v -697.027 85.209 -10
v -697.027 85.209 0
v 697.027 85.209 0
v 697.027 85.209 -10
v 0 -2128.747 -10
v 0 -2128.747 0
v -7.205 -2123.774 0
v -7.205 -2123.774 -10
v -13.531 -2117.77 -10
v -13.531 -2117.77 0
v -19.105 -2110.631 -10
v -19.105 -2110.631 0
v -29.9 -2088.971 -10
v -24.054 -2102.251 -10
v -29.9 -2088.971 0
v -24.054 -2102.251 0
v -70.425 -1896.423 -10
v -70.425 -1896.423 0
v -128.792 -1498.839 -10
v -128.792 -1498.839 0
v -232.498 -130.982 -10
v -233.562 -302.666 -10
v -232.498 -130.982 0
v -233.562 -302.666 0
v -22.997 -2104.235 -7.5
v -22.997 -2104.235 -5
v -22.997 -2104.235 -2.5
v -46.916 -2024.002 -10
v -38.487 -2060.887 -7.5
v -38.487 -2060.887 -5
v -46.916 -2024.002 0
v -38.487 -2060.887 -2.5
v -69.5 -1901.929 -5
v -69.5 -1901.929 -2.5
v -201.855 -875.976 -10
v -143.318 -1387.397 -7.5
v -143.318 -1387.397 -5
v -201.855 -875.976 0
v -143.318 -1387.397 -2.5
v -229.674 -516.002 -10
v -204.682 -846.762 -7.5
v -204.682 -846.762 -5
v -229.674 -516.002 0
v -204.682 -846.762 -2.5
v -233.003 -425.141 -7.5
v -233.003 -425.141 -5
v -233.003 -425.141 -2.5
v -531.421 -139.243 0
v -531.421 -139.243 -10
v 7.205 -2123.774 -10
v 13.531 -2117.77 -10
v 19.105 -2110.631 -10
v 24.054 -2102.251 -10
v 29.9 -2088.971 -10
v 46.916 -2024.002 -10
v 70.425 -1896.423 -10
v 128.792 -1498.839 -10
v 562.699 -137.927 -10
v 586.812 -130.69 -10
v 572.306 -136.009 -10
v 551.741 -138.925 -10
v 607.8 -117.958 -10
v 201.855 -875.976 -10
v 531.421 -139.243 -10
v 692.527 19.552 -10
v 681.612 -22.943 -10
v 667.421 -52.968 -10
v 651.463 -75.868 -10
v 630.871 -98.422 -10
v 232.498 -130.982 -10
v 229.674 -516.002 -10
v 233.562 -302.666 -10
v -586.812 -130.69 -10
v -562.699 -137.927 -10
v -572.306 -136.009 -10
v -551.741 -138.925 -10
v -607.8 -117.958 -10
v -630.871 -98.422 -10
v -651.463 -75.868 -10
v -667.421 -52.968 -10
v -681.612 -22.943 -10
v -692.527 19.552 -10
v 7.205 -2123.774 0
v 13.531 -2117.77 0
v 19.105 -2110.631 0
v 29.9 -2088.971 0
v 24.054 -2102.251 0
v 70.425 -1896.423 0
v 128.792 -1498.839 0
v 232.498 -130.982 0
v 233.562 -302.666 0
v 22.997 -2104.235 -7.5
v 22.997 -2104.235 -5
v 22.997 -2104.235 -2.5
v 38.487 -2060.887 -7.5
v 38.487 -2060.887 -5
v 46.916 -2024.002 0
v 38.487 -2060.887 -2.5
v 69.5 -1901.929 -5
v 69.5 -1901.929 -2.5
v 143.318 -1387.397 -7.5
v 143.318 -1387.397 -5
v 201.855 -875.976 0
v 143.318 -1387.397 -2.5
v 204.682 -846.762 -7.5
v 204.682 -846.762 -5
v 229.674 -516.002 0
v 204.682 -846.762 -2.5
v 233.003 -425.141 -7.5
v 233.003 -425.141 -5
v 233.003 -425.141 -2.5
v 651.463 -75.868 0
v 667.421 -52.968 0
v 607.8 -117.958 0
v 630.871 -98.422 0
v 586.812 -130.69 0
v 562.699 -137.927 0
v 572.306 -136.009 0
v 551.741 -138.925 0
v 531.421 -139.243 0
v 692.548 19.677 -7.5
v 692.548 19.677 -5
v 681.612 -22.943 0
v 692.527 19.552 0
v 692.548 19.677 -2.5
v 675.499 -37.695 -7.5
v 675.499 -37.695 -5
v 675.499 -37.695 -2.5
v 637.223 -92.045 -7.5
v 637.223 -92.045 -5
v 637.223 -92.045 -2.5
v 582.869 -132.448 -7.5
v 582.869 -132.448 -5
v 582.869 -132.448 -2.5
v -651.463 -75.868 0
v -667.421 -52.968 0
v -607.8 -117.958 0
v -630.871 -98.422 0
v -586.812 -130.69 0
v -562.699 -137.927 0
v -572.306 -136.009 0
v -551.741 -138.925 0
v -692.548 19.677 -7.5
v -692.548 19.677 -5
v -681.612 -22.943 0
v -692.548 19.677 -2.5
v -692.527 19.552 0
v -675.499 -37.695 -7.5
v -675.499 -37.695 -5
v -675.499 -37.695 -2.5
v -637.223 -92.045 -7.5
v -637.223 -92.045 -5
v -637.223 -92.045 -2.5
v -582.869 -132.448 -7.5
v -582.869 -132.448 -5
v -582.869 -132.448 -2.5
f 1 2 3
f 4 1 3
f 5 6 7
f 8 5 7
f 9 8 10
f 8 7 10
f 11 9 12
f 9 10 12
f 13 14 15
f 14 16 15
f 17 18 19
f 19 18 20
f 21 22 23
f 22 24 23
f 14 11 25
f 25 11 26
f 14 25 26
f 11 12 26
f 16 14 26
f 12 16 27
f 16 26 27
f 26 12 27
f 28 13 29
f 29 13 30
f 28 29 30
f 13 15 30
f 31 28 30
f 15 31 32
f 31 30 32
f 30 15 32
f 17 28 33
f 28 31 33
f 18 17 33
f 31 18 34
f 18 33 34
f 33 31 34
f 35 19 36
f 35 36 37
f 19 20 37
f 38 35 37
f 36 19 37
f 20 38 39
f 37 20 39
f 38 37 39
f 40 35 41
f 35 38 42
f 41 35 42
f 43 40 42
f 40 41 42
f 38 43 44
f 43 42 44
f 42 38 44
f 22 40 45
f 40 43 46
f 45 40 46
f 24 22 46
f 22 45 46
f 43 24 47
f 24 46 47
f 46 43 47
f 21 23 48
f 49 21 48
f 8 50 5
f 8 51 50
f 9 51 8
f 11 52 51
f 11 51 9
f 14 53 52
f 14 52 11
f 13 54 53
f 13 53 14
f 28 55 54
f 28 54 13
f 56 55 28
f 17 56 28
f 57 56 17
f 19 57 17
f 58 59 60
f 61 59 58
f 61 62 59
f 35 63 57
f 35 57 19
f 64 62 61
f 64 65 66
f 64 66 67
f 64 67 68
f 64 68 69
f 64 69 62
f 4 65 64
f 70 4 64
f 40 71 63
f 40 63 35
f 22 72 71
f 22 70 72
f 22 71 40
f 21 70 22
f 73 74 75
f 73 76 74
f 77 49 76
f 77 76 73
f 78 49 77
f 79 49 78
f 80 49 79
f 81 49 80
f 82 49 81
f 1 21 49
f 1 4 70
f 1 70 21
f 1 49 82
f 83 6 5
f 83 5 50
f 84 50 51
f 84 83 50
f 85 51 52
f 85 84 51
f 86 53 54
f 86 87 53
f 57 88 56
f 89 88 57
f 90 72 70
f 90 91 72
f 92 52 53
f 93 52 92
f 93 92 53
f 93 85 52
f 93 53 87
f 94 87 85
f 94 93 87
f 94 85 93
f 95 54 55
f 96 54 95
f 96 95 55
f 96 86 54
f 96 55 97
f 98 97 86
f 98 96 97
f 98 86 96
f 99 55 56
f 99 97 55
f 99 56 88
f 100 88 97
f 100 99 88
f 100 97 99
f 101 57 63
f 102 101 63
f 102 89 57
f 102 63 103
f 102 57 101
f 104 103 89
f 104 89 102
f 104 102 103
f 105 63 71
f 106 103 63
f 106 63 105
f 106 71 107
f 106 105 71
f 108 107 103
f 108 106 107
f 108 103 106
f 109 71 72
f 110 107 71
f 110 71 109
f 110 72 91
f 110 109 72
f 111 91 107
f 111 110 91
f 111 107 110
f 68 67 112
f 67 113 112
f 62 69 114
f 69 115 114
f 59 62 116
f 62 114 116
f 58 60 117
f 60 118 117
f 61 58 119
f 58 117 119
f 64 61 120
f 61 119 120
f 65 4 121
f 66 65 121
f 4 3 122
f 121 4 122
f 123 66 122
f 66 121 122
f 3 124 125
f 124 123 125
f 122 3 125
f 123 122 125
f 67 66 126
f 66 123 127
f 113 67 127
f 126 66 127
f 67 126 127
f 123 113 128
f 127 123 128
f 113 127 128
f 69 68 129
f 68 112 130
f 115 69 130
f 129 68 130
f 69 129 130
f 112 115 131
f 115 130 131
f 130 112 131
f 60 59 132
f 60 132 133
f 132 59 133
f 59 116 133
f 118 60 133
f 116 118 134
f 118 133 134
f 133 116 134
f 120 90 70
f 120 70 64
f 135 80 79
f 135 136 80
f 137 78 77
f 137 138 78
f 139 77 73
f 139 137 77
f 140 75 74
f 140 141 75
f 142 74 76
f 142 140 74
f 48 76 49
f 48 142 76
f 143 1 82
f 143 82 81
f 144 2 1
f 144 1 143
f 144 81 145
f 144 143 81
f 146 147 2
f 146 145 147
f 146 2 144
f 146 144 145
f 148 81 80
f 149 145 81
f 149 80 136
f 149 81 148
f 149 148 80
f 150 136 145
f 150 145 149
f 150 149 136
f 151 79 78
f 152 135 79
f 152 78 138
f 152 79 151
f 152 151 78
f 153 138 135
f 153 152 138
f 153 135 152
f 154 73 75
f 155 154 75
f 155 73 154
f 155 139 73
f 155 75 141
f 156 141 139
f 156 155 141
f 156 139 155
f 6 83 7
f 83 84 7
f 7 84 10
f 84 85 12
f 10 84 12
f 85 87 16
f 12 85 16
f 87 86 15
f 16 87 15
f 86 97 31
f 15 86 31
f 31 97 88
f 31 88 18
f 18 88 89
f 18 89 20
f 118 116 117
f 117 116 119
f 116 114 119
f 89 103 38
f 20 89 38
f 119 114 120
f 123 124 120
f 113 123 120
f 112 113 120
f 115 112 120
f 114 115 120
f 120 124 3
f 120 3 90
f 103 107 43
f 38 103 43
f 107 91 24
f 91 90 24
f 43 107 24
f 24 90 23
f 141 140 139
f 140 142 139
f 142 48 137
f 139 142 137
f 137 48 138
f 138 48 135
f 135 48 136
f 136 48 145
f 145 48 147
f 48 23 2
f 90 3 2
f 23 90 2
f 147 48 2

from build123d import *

# Parameters (mm, degrees)
F1_DEPTH = 10


with BuildPart() as f1:
    # F0 (on Top) → F1 (new body)
    with BuildSketch(Plane.XY):
        with BuildLine():
            Line((0, 85.2085053921), (0, -2128.7469863892))
            add(Edge.make_bspline(
                [(0, -2128.7469863892), (23.4590560131, -2115.0394865653), (59.9170876984, -2011.671111051), (178.1400323392, -1163.3441643463), (243.8064615583, -449.7847110684), (230.7232242509, -219.4097479535), (232.4981689453, -130.9822052717)],
                knots=[0, 0, 0, 0, 0.1206653396, 0.4678392709, 0.7964320829, 1, 1, 1, 1], degree=3))
            Line((232.4981689453, -130.9822052717), (531.4212441444, -139.2431110144))
            add(Edge.make_bspline(
                [(697.026848793, 85.2085053921), (697.5812315941, 54.1675575078), (692.2096198324, -0.9683446135), (663.0294773679, -71.7880519639), (586.4163084622, -141.5486278427), (548.5482408364, -138.9749926828), (531.4212441444, -139.2431110144)],
                knots=[0, 0, 0, 0, 0.2640358398, 0.5142505251, 0.7944573855, 1, 1, 1, 1], degree=3))
            Line((697.026848793, 85.2085053921), (0, 85.2085053921))
        make_face()
    extrude(amount=-F1_DEPTH)

    # F2: F1 across plane


with BuildPart() as f1_1:
    add(f1.part)
    add(f1.part.mirror(Plane.YZ))


solid = f1_1.part
